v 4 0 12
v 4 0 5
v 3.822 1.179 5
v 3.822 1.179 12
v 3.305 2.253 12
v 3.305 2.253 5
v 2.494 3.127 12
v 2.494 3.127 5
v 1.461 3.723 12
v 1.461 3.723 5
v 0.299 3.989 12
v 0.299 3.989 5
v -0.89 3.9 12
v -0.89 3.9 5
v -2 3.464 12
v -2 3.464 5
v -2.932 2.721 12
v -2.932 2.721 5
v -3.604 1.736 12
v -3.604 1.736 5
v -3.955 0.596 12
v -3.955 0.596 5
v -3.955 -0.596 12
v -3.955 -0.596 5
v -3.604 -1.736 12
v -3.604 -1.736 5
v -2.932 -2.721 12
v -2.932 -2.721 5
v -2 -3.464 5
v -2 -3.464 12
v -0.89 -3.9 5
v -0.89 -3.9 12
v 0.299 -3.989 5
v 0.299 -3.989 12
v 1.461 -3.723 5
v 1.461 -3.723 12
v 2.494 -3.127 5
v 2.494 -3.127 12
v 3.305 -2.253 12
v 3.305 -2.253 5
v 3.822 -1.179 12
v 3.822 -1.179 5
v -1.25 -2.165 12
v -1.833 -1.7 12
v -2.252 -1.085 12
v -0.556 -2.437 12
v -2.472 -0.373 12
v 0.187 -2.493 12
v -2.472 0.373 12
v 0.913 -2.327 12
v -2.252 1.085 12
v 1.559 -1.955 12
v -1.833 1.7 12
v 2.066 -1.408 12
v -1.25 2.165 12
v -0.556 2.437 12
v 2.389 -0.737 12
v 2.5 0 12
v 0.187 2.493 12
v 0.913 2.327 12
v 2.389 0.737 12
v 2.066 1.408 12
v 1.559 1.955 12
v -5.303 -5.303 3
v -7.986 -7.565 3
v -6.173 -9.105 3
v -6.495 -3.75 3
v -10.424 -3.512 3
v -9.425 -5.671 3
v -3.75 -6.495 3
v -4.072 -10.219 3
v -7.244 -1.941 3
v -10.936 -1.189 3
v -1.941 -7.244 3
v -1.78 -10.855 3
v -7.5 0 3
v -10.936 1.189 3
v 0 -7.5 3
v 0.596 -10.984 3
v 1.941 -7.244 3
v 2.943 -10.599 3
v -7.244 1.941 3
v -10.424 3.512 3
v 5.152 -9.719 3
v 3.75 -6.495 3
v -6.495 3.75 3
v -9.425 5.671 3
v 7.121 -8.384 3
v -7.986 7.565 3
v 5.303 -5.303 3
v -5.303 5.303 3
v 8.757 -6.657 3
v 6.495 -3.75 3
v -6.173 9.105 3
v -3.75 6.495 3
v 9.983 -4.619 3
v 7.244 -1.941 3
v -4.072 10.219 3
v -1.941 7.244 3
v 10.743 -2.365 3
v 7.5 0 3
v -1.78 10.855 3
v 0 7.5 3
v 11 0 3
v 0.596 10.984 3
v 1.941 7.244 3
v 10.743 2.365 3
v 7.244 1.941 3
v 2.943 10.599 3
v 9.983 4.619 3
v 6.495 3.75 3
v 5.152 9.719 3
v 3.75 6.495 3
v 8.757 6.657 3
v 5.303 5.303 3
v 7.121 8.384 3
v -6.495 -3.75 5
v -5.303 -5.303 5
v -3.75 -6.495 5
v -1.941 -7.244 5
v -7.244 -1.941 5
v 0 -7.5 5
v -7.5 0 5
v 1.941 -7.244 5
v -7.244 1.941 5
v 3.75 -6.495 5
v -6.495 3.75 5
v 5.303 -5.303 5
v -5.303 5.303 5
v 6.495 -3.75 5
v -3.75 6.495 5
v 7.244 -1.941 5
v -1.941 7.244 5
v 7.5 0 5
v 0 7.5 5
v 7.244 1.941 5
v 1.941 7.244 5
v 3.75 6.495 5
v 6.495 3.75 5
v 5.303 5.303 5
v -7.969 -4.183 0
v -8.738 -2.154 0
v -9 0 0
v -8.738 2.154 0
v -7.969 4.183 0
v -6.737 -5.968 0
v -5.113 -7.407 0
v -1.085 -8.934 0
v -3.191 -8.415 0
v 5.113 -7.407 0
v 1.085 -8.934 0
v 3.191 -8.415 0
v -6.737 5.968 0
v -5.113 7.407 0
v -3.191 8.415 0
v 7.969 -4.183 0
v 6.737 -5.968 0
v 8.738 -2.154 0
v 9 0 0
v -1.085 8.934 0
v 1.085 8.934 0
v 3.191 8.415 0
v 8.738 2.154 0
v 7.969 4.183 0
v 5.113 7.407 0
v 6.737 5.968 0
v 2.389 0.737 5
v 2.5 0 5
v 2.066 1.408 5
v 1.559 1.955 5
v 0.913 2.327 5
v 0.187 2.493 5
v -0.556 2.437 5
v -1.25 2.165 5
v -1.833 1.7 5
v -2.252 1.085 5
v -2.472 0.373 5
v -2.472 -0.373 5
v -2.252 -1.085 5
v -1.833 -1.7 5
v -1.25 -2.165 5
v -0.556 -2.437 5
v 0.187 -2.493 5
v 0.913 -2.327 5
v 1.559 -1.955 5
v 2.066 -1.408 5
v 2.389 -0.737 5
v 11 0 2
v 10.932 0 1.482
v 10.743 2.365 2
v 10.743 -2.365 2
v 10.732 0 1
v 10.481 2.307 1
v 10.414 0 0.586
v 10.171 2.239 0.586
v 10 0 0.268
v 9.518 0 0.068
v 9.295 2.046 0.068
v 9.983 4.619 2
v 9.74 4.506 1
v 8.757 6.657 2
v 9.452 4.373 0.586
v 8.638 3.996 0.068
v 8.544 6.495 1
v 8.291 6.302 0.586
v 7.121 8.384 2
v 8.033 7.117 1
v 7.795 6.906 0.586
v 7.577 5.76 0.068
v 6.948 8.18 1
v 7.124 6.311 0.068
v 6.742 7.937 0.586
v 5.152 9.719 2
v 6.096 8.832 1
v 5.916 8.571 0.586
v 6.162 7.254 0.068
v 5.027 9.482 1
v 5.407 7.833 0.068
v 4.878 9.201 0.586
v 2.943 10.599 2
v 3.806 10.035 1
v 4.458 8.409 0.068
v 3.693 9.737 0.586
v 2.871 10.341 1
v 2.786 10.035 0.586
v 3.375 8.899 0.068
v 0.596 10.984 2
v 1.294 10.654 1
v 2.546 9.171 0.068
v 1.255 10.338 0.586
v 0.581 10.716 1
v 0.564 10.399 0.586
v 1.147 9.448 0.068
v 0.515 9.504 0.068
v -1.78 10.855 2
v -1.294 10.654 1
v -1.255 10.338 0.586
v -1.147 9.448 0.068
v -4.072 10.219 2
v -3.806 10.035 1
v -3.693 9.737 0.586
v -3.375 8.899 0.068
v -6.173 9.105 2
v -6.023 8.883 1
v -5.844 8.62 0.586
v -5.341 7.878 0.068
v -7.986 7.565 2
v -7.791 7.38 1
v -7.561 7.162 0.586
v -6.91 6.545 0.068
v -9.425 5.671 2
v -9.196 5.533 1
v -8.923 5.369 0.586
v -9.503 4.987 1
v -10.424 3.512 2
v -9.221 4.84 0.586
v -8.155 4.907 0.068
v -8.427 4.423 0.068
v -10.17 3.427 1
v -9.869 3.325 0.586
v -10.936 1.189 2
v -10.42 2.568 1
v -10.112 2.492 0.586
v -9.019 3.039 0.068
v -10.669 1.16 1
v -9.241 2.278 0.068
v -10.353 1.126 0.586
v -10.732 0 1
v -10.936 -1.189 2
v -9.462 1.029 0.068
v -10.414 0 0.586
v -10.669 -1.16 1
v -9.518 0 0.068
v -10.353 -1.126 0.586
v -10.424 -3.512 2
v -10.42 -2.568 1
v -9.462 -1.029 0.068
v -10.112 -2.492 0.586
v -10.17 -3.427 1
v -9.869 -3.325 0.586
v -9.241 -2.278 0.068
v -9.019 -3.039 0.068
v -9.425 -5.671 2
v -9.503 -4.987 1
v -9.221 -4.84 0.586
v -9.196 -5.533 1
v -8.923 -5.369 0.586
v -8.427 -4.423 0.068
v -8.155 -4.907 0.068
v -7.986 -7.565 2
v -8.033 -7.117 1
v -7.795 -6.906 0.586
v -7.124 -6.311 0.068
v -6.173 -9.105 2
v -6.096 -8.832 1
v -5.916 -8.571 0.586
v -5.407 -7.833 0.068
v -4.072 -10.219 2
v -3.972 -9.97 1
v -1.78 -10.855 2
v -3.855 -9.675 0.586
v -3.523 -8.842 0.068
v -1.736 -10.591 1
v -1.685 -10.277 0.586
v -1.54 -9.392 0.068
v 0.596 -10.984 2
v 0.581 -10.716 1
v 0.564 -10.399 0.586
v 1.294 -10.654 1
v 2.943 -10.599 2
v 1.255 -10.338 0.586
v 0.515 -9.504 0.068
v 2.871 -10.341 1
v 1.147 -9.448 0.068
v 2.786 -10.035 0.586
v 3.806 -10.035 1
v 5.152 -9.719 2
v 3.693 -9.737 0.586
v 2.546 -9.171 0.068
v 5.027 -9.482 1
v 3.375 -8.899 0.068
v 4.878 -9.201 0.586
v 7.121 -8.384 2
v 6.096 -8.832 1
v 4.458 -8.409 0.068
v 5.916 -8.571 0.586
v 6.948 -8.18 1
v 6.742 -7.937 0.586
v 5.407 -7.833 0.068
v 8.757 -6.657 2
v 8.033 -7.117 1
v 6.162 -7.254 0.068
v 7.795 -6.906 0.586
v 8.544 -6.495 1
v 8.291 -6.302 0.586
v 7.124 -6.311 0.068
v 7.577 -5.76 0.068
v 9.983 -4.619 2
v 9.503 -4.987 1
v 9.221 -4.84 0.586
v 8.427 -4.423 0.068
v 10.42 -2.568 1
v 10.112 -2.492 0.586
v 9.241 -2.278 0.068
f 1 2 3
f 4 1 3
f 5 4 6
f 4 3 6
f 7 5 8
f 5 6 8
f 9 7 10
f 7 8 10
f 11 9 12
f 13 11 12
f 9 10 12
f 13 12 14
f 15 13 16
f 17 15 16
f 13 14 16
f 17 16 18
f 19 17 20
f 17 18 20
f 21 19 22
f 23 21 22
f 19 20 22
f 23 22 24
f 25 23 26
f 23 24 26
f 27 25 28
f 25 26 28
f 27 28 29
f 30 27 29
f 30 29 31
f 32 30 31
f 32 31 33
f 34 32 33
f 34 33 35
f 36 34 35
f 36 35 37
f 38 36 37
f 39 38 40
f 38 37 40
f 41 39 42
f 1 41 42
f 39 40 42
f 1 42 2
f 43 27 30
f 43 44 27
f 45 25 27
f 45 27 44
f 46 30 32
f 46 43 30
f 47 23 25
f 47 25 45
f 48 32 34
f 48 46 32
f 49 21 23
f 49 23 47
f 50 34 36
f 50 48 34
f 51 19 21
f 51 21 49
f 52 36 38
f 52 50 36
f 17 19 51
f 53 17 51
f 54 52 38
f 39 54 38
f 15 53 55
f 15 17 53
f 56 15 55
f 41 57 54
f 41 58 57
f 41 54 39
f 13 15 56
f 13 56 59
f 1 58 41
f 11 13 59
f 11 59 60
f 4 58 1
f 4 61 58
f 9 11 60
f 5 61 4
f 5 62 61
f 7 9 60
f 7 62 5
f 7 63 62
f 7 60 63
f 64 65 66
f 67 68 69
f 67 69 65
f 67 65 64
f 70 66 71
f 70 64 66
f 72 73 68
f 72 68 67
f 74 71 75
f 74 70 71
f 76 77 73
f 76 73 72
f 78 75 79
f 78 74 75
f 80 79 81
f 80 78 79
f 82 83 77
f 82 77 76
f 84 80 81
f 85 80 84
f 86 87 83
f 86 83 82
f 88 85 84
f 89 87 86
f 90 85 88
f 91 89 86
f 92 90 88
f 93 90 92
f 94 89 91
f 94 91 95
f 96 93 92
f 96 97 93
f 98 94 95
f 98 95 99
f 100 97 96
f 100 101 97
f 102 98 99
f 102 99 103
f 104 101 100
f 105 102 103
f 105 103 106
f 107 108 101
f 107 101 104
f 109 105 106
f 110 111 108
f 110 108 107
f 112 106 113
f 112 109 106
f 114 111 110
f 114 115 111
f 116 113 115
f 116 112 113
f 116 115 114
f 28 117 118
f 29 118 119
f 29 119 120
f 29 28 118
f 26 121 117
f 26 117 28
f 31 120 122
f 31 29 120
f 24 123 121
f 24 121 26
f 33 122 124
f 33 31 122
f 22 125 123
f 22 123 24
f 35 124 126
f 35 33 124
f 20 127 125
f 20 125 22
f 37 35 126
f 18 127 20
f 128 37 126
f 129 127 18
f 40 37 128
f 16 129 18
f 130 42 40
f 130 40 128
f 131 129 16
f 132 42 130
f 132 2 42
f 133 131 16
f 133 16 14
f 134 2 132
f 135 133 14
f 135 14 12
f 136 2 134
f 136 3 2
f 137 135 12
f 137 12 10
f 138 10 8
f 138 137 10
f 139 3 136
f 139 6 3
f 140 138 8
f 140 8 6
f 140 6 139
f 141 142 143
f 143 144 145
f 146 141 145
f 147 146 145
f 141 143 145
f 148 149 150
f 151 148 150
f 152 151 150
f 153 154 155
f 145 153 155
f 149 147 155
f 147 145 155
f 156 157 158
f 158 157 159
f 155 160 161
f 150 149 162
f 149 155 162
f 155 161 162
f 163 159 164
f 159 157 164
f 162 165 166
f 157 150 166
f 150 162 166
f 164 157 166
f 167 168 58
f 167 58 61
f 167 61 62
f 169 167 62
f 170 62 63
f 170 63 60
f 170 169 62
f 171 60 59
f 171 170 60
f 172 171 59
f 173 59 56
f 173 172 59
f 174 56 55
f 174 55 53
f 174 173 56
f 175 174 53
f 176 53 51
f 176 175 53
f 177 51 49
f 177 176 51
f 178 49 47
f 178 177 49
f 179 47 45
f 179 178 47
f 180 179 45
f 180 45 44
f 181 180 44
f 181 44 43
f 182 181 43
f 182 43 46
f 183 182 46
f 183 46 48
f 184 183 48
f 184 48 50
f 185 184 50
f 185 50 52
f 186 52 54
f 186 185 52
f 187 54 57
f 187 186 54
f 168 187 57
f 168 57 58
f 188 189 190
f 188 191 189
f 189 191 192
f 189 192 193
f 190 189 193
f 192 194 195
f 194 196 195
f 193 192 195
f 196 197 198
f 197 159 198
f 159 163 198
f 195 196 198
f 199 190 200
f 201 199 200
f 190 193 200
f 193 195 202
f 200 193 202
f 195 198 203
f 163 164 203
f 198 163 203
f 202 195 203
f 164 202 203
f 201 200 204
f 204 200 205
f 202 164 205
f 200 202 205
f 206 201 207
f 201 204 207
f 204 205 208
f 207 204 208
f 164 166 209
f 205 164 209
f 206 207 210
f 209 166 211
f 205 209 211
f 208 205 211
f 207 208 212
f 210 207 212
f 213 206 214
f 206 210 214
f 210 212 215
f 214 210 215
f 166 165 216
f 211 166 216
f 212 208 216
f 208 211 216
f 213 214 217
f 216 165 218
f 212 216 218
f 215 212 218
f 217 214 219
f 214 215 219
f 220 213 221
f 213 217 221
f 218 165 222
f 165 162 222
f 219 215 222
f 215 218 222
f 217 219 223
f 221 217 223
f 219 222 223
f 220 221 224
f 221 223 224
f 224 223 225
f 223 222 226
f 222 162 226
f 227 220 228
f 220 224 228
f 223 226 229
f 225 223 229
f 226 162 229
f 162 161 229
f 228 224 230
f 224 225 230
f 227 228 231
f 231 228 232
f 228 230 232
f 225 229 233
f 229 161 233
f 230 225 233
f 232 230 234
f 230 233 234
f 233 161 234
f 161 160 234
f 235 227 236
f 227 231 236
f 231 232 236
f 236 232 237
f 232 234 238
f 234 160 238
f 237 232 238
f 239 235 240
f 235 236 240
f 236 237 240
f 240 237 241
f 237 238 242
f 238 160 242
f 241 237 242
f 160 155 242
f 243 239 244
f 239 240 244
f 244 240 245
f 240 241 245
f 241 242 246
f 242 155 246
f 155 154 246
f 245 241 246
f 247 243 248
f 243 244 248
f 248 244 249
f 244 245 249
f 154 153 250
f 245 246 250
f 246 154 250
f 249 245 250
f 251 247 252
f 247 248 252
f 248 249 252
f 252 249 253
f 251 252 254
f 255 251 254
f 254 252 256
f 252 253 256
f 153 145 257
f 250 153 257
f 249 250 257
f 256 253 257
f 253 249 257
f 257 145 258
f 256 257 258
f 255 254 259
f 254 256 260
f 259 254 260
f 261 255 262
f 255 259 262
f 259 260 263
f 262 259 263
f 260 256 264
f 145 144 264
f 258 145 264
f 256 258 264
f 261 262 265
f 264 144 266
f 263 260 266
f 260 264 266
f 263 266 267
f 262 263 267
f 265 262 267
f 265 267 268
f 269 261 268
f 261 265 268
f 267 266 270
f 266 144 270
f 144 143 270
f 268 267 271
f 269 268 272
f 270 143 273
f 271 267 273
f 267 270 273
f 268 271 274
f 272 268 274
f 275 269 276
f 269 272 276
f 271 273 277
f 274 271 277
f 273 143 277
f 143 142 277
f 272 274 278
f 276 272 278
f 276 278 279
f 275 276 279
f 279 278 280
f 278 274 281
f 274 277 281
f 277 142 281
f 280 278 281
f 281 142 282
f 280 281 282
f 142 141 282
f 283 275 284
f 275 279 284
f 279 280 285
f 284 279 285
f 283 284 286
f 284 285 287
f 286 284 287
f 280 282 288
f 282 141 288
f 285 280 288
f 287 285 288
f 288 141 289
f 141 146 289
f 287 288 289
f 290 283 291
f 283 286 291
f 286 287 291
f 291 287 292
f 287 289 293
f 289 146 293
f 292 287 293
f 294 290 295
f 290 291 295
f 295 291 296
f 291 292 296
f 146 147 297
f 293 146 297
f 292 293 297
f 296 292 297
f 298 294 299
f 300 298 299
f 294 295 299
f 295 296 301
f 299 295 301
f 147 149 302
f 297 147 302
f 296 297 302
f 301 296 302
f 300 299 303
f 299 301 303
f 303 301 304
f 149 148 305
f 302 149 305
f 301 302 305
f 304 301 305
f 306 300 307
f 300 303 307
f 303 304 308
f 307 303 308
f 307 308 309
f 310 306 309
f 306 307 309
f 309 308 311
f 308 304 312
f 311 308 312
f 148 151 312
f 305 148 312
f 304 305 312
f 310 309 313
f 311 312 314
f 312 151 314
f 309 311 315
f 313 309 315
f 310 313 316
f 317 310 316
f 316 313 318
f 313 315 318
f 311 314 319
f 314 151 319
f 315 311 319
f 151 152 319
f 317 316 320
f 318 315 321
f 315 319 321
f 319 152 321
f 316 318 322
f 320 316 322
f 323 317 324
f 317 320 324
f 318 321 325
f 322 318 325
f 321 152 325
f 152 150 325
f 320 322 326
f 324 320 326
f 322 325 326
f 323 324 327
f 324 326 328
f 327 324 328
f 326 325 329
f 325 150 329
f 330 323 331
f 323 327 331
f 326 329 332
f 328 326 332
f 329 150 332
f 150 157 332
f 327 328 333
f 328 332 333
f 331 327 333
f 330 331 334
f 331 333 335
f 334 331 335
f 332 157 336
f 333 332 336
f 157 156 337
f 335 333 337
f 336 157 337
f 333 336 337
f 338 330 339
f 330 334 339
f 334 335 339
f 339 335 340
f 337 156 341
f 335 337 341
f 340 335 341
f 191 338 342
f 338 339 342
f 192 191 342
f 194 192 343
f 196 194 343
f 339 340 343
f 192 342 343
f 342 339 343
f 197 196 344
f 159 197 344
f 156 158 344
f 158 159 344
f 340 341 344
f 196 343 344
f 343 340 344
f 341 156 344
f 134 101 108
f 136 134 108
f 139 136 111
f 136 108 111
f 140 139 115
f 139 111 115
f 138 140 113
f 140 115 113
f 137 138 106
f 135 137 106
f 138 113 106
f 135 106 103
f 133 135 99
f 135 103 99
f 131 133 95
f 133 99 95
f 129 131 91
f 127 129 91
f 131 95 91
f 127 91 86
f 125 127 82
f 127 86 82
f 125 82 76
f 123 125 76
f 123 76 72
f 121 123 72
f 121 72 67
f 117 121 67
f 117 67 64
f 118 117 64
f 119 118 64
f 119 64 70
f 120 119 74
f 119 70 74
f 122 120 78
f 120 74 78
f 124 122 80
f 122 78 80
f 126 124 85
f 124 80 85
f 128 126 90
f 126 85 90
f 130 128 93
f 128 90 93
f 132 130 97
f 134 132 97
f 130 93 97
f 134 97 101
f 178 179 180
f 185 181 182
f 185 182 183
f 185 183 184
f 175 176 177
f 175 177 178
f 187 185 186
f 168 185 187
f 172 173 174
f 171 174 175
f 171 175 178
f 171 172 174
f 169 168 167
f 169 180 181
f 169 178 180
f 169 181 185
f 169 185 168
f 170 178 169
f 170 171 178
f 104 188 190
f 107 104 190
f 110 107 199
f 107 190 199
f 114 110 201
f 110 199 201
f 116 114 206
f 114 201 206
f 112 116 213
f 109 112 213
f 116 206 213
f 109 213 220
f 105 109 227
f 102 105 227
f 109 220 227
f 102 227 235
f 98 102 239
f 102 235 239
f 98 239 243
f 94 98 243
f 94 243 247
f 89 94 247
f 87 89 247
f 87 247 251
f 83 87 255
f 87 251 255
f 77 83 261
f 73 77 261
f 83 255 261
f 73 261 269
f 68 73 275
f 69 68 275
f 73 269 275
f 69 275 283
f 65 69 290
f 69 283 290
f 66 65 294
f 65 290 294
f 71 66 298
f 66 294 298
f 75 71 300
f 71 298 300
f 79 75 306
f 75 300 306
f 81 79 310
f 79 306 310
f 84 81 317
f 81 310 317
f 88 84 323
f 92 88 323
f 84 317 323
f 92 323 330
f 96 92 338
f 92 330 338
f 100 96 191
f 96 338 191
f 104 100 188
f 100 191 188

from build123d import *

# Parameters (mm, degrees)
F0_R     = 11
F1_DEPTH = 3
F2_R     = 2
F3_R     = 7.5
F4_DEPTH = 2
F5_R     = 4
F5_R_2   = 2.5
F6_DEPTH = 7


with BuildPart() as f1:
    # F0 (on Top) → F1 (new body)
    with BuildSketch(Plane.XY):
        Circle(F0_R)
    extrude(amount=F1_DEPTH)

    # F2
    f2_edges = [f1.edges().sort_by_distance(p)[0] for p in [
        (-11, 0, 0),
    ]]
    fillet(f2_edges, radius=F2_R)

    # F3 (on face) → F4 (join)
    with BuildSketch(Plane.XY.offset(3)):
        Circle(F3_R)
    extrude(amount=F4_DEPTH)

    # F5 (on face) → F6 (join)
    with BuildSketch(Plane.XY.offset(5)):
        Circle(F5_R)
        Circle(F5_R_2, mode=Mode.SUBTRACT)
    extrude(amount=F6_DEPTH)


solid = f1.part
